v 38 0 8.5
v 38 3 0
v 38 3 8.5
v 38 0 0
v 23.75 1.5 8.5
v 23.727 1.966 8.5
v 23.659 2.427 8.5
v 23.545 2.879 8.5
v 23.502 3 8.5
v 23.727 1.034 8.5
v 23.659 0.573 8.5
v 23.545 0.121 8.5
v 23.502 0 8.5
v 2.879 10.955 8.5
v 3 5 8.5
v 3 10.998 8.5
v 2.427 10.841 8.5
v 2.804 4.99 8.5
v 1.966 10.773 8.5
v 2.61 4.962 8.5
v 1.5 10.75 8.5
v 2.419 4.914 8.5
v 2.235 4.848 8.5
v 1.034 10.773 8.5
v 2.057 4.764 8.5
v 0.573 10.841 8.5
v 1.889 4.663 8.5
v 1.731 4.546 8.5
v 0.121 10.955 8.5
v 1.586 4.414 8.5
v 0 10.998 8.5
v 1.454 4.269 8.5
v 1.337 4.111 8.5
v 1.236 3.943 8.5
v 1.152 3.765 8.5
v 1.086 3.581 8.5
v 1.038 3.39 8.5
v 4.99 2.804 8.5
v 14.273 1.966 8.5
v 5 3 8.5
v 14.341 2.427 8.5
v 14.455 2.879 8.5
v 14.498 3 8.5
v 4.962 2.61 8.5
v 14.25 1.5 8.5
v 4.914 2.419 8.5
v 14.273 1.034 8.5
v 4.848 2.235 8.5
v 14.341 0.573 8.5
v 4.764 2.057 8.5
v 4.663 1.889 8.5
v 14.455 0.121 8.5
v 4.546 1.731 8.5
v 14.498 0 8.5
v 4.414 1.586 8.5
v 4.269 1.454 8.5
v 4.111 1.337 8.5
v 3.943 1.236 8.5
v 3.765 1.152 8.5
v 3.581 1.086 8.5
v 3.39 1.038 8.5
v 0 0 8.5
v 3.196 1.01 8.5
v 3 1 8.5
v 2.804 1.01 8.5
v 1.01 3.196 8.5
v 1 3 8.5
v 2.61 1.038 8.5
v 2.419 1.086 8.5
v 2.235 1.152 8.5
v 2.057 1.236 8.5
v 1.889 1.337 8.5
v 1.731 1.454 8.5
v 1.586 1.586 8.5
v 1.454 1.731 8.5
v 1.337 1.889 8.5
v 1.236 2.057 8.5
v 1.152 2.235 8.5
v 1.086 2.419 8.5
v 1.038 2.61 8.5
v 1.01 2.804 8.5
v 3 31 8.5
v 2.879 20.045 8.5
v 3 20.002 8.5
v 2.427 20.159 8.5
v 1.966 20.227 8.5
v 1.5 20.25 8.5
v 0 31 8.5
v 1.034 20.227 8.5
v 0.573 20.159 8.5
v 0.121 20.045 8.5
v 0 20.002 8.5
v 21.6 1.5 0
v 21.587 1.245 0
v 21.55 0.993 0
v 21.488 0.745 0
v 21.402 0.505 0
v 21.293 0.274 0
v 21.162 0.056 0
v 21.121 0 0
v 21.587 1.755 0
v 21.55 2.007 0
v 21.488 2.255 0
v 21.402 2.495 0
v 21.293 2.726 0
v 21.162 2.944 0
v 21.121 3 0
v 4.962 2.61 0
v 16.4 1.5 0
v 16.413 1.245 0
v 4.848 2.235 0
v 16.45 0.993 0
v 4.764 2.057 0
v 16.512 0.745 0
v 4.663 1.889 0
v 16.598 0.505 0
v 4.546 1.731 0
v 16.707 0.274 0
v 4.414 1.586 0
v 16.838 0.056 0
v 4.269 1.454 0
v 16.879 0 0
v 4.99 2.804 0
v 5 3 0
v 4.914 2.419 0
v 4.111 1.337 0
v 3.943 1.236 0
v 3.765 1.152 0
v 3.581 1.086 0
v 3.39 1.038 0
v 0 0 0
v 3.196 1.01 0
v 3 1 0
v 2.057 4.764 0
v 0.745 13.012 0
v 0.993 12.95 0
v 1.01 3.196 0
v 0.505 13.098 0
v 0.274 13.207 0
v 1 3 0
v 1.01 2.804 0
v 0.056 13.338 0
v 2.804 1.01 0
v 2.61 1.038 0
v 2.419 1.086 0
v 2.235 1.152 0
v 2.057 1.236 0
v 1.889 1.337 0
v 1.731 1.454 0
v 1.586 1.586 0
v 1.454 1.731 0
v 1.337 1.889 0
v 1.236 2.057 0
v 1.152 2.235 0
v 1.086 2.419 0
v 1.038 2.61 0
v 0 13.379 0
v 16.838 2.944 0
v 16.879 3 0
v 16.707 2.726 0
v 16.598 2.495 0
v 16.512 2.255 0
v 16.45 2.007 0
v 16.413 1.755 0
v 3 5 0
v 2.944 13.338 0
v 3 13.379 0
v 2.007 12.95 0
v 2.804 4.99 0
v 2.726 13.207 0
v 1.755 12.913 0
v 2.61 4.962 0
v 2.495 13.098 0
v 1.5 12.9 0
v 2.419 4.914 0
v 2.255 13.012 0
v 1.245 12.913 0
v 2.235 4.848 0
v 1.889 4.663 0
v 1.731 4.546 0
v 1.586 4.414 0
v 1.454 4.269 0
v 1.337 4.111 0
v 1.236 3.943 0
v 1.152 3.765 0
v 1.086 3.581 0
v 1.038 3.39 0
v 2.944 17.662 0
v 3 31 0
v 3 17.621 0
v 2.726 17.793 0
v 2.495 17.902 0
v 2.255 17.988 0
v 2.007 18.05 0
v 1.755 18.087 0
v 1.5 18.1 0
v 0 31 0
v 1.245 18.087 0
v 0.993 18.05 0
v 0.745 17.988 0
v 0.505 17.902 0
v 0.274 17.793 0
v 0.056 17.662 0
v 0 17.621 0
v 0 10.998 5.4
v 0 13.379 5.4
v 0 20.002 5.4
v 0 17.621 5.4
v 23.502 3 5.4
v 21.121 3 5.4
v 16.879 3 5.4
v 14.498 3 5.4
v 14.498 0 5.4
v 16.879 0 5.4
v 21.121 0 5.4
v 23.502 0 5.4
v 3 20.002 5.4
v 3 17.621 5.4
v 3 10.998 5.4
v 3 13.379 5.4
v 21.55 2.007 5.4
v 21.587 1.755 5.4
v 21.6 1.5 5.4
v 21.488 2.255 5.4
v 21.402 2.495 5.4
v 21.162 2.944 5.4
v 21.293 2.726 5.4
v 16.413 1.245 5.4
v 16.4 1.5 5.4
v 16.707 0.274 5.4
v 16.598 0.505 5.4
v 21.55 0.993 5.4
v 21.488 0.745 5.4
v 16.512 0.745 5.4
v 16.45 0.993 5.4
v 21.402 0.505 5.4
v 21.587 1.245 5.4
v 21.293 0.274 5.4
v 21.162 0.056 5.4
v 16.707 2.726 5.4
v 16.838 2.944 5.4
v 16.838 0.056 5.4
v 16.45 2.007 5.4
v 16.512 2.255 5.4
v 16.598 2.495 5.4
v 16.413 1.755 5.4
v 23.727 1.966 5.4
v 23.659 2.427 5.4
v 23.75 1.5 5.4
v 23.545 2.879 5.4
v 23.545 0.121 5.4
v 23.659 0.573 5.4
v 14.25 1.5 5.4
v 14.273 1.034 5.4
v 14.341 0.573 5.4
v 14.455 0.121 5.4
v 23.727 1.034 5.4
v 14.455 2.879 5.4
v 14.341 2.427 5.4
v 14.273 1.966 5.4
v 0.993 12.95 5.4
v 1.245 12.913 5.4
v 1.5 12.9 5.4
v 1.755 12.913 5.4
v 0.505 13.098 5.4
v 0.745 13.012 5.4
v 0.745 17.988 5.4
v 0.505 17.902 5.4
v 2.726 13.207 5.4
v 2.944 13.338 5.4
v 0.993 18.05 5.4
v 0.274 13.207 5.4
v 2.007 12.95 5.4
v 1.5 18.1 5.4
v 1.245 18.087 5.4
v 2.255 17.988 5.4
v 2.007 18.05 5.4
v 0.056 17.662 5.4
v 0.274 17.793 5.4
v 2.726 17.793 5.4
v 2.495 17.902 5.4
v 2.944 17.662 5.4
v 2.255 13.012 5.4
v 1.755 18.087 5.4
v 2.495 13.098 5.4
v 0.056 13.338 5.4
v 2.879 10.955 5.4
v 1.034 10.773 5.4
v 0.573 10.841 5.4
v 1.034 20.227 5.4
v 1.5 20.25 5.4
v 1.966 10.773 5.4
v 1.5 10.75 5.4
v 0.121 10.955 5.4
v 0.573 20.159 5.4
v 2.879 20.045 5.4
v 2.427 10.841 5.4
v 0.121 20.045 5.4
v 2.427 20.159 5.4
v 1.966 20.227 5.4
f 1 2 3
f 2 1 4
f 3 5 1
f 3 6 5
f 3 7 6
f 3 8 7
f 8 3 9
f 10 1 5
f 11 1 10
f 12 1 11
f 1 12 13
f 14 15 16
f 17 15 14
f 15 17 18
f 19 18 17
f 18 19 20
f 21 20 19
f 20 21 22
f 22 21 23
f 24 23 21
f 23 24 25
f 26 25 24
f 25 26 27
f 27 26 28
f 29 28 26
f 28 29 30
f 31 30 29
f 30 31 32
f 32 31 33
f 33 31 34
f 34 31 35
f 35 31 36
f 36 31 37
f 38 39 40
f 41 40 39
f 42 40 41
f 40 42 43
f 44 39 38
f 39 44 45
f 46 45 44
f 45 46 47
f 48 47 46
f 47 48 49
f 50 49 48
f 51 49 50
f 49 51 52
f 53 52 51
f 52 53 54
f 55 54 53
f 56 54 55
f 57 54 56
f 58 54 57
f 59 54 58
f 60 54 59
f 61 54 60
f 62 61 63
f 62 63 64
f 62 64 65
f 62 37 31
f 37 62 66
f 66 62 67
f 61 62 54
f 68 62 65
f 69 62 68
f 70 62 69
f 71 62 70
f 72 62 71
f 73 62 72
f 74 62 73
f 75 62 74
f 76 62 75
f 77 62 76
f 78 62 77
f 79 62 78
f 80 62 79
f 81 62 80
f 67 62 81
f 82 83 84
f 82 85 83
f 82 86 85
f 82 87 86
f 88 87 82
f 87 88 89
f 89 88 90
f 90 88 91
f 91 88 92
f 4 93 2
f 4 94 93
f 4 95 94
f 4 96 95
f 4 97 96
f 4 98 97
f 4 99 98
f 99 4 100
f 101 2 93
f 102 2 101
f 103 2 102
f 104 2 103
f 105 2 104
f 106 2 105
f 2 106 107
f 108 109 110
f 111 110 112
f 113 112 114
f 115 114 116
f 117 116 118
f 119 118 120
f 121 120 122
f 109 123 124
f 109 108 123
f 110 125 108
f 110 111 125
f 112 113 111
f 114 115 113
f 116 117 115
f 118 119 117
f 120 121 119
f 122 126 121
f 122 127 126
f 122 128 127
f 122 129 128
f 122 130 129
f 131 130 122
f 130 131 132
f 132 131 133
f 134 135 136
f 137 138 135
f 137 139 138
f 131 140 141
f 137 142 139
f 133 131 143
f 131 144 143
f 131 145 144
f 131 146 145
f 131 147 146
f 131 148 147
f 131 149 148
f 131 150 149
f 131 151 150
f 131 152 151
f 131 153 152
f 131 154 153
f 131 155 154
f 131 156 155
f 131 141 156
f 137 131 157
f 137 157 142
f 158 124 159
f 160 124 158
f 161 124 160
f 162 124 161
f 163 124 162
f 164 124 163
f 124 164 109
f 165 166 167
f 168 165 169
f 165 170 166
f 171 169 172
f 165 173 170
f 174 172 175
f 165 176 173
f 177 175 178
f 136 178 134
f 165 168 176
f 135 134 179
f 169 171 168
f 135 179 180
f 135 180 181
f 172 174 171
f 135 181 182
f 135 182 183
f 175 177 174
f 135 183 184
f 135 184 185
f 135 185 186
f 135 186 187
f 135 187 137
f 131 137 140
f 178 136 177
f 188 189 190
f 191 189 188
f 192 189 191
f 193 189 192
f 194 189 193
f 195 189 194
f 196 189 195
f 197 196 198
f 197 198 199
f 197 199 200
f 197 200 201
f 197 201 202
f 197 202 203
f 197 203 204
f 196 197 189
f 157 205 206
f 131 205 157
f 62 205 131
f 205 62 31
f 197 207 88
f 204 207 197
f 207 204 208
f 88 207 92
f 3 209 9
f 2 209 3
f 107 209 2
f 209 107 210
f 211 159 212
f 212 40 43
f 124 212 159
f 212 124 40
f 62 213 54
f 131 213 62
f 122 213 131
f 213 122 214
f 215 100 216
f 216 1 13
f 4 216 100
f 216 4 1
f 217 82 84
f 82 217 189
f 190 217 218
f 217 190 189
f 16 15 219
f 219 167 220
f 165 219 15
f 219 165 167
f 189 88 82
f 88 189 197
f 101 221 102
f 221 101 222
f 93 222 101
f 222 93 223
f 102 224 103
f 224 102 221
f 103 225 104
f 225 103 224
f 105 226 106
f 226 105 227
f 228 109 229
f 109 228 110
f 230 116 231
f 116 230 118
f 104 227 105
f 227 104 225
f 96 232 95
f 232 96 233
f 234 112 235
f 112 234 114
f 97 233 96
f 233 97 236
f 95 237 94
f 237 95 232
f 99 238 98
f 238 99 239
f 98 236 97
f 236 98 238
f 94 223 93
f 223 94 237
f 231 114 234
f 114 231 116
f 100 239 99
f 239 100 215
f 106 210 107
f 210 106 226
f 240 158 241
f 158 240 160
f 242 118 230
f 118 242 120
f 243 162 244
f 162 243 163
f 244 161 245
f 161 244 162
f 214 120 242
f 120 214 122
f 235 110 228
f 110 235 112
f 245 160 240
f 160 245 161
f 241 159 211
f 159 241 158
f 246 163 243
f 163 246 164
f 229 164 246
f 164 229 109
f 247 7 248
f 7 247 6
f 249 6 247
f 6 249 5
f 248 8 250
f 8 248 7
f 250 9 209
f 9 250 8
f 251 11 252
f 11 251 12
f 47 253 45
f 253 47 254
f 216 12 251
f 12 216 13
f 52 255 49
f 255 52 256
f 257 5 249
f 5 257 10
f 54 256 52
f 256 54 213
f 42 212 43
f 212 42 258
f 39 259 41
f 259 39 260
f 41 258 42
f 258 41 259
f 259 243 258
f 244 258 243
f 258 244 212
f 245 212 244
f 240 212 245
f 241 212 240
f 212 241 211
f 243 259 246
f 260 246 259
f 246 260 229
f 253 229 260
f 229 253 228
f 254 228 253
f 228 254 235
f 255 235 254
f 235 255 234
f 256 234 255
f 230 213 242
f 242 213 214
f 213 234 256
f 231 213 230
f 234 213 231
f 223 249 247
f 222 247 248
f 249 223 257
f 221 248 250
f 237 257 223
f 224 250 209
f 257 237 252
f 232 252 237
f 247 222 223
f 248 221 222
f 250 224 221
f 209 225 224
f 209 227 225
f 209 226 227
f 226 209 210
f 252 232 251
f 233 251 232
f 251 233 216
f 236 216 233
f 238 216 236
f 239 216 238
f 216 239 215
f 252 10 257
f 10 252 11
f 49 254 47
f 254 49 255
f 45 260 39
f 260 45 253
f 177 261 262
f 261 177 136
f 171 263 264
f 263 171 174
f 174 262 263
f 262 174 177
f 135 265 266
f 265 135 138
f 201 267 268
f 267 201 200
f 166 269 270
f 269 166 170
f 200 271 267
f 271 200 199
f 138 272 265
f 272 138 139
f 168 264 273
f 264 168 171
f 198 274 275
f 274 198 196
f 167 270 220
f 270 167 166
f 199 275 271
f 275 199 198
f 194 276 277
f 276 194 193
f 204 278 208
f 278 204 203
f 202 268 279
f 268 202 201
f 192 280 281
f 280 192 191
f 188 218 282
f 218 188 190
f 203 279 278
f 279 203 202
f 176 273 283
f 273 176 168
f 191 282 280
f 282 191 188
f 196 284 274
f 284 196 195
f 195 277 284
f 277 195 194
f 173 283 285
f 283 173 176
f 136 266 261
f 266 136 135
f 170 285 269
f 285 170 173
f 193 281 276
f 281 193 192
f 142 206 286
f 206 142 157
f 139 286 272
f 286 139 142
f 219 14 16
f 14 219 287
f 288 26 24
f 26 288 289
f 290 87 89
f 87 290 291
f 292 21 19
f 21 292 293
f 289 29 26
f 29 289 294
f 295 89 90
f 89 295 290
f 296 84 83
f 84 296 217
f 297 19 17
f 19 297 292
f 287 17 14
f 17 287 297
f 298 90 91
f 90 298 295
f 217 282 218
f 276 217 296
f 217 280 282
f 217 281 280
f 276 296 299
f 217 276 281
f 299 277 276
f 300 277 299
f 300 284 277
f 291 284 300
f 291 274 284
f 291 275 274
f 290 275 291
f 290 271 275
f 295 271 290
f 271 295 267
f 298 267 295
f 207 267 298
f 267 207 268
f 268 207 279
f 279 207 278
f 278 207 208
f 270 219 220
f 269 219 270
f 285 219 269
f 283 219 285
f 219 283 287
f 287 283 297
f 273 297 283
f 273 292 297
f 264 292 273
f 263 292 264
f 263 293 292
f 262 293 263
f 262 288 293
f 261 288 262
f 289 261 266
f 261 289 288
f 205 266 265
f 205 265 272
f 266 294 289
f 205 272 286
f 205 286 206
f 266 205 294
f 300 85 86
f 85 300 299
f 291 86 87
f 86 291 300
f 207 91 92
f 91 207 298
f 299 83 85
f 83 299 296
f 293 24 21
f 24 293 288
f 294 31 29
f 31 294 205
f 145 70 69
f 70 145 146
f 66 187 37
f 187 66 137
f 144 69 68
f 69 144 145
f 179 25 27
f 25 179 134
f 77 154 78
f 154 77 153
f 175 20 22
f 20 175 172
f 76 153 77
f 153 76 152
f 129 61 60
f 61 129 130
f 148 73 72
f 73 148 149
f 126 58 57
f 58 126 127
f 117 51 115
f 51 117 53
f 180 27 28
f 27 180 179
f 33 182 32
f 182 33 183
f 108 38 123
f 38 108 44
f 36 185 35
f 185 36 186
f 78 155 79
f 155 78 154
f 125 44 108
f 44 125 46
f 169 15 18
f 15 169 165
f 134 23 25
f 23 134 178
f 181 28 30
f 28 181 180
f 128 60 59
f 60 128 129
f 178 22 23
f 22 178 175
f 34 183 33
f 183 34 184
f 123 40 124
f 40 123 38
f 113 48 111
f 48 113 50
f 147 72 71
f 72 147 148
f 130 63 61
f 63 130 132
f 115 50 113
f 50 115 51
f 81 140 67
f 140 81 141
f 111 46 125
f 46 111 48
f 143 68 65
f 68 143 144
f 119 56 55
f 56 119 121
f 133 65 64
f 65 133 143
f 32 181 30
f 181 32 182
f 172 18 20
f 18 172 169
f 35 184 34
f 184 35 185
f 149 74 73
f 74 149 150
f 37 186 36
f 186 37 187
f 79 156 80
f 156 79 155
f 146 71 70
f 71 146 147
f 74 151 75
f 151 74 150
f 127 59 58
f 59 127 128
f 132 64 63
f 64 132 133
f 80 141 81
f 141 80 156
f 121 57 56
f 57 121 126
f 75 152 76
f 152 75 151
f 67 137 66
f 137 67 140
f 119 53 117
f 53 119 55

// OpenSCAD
$fn = 64;

size = [38, 31, 8.5];   // overall bounding box (X,Y,Z)
wall = 3;               // leg thickness
hole_d = 5.2;           // clearance for M5
csk_d = 9.5;            // counterbore diameter
csk_h = 3.0;            // counterbore depth
fillet_r = 2.0;         // inner corner relief

module extrusion_bracket(sz=[38,31,8.5], t=3, hd=5.2, cbd=9.5, cbh=3.0, r=2.0) {
    x = sz[0]; y = sz[1]; z = sz[2];

    difference() {
        // L-bracket body
        union() {
            // base leg (along X)
            cube([x, t, z], center=false);
            // side leg (along Y)
            cube([t, y, z], center=false);
        }

        // inner corner relief (quarter-cylinder cut)
        translate([t, t, 0])
            cylinder(h=z+0.2, r=r, center=false);

        // Hole in base leg (through Z), centered in base leg area
        translate([x/2, t/2, -0.1]) {
            cylinder(h=z+0.2, d=hd, center=false);
            // counterbore from top
            translate([0,0,z-cbh])
                cylinder(h=cbh+0.2, d=cbd, center=false);
        }

        // Hole in side leg (through Z), centered in side leg area
        translate([t/2, y/2, -0.1]) {
            cylinder(h=z+0.2, d=hd, center=false);
            // counterbore from top
            translate([0,0,z-cbh])
                cylinder(h=cbh+0.2, d=cbd, center=false);
        }
    }
}

extrusion_bracket(size, wall, hole_d, csk_d, csk_h, fillet_r);
